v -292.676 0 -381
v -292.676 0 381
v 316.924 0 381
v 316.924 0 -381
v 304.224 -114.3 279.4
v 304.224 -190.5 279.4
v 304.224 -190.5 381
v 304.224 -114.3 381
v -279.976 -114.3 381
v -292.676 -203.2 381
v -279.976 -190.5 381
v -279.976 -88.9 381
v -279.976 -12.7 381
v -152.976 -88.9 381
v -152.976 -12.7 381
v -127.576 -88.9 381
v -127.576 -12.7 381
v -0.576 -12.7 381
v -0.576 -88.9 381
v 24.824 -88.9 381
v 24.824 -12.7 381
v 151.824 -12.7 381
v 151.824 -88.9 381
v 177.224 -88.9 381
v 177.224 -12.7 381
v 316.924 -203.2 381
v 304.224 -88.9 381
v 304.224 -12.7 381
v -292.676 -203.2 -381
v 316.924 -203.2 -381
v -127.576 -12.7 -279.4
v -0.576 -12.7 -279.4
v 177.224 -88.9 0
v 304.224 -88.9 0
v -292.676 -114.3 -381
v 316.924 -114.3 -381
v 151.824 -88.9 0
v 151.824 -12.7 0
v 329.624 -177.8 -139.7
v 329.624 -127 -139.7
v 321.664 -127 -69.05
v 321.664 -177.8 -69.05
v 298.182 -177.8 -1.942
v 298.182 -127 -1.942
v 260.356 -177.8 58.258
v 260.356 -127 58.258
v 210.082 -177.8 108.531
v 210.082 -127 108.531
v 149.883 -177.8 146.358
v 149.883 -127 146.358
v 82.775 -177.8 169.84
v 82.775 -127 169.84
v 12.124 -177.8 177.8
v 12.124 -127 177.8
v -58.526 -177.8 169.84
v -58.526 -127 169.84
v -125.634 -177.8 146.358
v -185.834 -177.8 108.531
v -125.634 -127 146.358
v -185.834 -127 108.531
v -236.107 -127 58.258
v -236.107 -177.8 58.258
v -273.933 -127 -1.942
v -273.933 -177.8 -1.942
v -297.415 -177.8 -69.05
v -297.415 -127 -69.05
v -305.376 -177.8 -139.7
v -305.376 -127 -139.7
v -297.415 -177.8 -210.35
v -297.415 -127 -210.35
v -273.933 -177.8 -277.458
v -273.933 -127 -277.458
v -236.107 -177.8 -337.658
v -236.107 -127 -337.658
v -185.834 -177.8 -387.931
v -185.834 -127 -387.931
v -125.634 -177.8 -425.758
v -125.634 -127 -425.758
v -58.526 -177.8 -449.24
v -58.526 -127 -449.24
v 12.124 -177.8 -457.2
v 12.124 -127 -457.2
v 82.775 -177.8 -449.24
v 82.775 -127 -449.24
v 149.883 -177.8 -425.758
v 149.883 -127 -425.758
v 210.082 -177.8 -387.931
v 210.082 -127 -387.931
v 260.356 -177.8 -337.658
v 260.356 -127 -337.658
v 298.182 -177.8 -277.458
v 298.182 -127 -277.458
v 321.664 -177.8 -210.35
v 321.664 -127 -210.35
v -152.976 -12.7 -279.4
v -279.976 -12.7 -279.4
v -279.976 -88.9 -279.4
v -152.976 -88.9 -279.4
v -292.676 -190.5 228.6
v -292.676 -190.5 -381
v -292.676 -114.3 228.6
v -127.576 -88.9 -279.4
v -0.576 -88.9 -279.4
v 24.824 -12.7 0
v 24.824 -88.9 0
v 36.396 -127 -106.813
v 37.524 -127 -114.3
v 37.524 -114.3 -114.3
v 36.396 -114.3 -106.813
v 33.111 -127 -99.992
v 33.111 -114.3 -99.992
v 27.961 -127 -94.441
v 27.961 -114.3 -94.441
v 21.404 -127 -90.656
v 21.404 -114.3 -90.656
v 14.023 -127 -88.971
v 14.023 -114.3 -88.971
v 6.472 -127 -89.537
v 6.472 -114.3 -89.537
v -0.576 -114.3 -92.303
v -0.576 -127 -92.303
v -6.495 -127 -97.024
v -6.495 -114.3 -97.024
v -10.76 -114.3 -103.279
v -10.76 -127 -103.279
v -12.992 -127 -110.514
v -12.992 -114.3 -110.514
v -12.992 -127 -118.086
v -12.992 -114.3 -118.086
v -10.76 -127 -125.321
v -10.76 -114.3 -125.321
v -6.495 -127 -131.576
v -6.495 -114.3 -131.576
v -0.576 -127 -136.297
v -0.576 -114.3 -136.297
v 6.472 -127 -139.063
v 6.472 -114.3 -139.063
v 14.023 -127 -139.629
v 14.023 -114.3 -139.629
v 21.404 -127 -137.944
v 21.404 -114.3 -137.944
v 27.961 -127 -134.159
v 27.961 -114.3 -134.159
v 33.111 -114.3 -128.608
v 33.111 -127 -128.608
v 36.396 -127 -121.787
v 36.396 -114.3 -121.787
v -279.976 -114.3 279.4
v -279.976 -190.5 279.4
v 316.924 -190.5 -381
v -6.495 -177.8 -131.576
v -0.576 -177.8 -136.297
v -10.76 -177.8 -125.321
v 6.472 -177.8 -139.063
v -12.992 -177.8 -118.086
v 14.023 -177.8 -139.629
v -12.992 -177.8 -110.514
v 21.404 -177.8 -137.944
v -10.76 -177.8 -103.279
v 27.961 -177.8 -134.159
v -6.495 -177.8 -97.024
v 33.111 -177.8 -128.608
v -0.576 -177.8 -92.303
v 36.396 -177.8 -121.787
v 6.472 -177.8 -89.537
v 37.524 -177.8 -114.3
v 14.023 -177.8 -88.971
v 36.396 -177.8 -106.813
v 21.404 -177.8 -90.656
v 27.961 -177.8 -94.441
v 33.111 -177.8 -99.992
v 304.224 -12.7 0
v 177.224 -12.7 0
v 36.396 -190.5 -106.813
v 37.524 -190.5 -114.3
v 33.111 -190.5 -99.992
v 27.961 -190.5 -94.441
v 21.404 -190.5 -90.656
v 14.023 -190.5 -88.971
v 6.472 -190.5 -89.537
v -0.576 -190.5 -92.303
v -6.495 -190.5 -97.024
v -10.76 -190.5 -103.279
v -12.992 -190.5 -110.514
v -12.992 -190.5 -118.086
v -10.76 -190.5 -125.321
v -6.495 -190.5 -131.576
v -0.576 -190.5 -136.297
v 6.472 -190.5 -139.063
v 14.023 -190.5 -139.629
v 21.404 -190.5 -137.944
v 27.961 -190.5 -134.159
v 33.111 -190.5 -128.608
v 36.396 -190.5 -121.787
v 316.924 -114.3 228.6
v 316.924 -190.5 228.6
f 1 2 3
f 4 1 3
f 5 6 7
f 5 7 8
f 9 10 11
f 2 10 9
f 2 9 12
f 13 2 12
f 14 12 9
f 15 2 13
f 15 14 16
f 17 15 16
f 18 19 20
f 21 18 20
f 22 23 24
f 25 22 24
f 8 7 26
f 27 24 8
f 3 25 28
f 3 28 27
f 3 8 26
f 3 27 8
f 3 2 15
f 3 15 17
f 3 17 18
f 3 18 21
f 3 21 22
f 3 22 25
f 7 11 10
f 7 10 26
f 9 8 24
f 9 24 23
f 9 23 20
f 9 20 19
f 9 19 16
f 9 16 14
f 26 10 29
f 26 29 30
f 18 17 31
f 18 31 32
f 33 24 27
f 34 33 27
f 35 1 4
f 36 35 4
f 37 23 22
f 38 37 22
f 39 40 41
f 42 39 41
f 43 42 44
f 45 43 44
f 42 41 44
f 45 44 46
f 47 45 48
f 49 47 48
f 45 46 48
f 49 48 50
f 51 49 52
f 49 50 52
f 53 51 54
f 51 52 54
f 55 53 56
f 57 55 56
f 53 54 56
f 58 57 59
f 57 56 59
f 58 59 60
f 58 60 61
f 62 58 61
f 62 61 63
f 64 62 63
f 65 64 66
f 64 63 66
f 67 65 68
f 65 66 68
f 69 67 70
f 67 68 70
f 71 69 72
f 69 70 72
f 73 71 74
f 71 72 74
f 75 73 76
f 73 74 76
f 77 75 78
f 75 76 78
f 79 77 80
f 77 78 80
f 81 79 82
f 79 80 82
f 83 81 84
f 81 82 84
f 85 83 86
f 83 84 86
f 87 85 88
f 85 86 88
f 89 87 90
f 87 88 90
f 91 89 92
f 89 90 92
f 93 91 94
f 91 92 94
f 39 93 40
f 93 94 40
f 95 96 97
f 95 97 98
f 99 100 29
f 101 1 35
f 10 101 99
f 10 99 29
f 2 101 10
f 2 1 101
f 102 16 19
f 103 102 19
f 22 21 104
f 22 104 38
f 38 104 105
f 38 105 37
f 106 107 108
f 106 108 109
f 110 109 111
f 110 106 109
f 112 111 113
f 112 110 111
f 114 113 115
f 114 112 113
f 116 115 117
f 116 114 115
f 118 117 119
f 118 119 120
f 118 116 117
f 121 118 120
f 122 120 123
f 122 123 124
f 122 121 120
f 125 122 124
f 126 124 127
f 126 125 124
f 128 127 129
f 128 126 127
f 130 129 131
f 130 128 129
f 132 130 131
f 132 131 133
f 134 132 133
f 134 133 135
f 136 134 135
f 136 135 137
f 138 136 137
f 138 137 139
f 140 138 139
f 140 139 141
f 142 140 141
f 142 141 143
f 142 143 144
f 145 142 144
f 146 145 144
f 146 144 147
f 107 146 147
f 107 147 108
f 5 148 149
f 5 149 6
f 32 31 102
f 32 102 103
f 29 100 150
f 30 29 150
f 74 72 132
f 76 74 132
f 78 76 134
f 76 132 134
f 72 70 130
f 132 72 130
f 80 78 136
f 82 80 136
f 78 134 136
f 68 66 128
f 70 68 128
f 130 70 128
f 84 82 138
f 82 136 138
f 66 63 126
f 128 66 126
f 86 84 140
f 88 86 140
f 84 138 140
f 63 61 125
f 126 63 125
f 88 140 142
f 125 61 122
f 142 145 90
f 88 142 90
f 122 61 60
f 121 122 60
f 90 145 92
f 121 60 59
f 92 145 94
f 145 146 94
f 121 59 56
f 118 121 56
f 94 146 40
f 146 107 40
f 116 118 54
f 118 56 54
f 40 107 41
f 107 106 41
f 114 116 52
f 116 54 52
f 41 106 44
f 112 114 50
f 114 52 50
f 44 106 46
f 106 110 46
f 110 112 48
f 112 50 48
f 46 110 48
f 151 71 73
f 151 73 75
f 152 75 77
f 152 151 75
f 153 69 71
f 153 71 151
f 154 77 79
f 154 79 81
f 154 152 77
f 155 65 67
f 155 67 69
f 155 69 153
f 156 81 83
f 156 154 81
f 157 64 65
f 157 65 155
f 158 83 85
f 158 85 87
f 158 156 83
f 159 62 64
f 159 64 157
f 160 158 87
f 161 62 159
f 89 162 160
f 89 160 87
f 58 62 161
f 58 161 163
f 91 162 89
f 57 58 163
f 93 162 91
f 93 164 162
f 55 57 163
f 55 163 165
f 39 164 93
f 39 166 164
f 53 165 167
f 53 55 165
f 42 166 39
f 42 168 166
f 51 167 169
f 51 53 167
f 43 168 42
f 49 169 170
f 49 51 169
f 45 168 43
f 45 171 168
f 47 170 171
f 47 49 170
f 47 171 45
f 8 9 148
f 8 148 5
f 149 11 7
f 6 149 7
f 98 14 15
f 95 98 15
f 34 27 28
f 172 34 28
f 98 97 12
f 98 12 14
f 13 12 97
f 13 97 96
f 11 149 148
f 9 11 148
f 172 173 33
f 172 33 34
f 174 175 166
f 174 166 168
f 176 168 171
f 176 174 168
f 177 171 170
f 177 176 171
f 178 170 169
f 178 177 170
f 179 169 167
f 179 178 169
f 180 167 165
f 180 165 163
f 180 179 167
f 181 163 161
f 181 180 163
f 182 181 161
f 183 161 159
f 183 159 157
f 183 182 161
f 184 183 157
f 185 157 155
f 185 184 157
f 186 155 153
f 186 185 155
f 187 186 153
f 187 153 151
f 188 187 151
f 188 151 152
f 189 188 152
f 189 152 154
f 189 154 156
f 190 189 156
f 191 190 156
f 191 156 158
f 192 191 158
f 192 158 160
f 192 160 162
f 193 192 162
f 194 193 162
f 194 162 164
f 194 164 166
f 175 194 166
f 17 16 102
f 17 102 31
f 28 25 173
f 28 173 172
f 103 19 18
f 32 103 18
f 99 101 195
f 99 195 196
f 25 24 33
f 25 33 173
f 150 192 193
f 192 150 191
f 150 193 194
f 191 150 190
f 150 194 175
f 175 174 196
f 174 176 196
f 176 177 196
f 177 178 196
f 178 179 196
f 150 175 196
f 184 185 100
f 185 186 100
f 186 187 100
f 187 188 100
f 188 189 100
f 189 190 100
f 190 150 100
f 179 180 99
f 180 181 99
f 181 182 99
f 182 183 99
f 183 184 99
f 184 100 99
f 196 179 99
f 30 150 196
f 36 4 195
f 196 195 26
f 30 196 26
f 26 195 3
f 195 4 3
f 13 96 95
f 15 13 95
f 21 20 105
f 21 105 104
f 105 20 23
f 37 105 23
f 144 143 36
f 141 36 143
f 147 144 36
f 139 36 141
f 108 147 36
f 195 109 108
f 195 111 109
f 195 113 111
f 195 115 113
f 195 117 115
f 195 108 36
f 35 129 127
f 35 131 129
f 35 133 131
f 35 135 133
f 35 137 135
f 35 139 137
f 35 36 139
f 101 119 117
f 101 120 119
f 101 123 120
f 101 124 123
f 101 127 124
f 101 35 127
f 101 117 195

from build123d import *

# Parameters (mm, degrees)
F0_W      = 609.6
F0_H      = 762
F1_DEPTH  = 203.2
F2_W      = 76.2
F2_H      = 609.6
F3_DEPTH  = 609.6
F4_W      = 584.2
F4_H      = 76.2
F5_DEPTH  = 101.6
F7_W      = 127
F7_H      = 76.2
F8_DEPTH  = 660.4
F9_W      = 127
F9_H      = 76.2
F10_DEPTH = 660.4
F11_W     = 127
F11_H     = 76.2
F13_DEPTH = 381
F14_DEPTH = 381
F12_W     = 127
F12_H     = 76.2
F15_DEPTH = 381
F16_R     = 25.4
F17_DEPTH = 88.9
F19_R     = 317.5
F20_DEPTH = 50.8


with BuildPart() as f1:
    # F0 (on Front) → F1 (new body)
    with BuildSketch(Plane.XZ):
        with Locations((12.1244145464, 0)):
            Rectangle(F0_W, F0_H)
    extrude(amount=F1_DEPTH)

    # F2 (on face) → F3 (cut)
    with BuildSketch(Plane(origin=(-292.6755854536, 0, 0), x_dir=(0, -1, 0), z_dir=(-1, 0, 0))):
        with Locations((152.4, -76.2)):
            Rectangle(F2_W, F2_H)
    extrude(amount=-F3_DEPTH, mode=Mode.SUBTRACT)

    # F4 (on face) → F5 (cut)
    with BuildSketch(Plane.XY.offset(381)):
        with Locations((12.1244145464, -152.4)):
            Rectangle(F4_W, F4_H)
    extrude(amount=-F5_DEPTH, mode=Mode.SUBTRACT)

    # F7 (on face) → F8 (cut)
    with BuildSketch(Plane.XY.offset(381)):
        with Locations((-216.4755854536, -50.8)):
            Rectangle(F7_W, F7_H)
    extrude(amount=-F8_DEPTH, mode=Mode.SUBTRACT)

    # F9 (on face) → F10 (cut)
    with BuildSketch(Plane.XY.offset(381)):
        with Locations((-64.0755854536, -50.8)):
            Rectangle(F9_W, F9_H)
    extrude(amount=-F10_DEPTH, mode=Mode.SUBTRACT)

    # F11 (on face) → F13 (cut)
    with BuildSketch(Plane.XY.offset(381)):
        with Locations((88.3244145464, -50.8)):
            Rectangle(F11_W, F11_H)
    extrude(amount=-F13_DEPTH, mode=Mode.SUBTRACT)

    # F11 (on face) → F14 (cut)
    with BuildSketch(Plane.XY.offset(381)):
        with Locations((88.3244145464, -50.8)):
            Rectangle(F11_W, F11_H)
    extrude(amount=-F14_DEPTH, mode=Mode.SUBTRACT)

    # F12 (on face) → F15 (cut)
    with BuildSketch(Plane.XY.offset(381)):
        with Locations((240.7244145464, -50.8)):
            Rectangle(F12_W, F12_H)
    extrude(amount=-F15_DEPTH, mode=Mode.SUBTRACT)

    # F16 (on face) → F17 (join)
    with BuildSketch(Plane.XZ.offset(203.2)):
        with Locations((12.1244145464, -114.3)):
            Circle(F16_R)
    extrude(amount=-F17_DEPTH)

    # F19 (on offset) → F20 (join)
    with BuildSketch(Plane.XZ.offset(127)):
        with Locations((12.1244145464, -139.7)):
            Circle(F19_R)
    extrude(amount=F20_DEPTH)


solid = f1.part
